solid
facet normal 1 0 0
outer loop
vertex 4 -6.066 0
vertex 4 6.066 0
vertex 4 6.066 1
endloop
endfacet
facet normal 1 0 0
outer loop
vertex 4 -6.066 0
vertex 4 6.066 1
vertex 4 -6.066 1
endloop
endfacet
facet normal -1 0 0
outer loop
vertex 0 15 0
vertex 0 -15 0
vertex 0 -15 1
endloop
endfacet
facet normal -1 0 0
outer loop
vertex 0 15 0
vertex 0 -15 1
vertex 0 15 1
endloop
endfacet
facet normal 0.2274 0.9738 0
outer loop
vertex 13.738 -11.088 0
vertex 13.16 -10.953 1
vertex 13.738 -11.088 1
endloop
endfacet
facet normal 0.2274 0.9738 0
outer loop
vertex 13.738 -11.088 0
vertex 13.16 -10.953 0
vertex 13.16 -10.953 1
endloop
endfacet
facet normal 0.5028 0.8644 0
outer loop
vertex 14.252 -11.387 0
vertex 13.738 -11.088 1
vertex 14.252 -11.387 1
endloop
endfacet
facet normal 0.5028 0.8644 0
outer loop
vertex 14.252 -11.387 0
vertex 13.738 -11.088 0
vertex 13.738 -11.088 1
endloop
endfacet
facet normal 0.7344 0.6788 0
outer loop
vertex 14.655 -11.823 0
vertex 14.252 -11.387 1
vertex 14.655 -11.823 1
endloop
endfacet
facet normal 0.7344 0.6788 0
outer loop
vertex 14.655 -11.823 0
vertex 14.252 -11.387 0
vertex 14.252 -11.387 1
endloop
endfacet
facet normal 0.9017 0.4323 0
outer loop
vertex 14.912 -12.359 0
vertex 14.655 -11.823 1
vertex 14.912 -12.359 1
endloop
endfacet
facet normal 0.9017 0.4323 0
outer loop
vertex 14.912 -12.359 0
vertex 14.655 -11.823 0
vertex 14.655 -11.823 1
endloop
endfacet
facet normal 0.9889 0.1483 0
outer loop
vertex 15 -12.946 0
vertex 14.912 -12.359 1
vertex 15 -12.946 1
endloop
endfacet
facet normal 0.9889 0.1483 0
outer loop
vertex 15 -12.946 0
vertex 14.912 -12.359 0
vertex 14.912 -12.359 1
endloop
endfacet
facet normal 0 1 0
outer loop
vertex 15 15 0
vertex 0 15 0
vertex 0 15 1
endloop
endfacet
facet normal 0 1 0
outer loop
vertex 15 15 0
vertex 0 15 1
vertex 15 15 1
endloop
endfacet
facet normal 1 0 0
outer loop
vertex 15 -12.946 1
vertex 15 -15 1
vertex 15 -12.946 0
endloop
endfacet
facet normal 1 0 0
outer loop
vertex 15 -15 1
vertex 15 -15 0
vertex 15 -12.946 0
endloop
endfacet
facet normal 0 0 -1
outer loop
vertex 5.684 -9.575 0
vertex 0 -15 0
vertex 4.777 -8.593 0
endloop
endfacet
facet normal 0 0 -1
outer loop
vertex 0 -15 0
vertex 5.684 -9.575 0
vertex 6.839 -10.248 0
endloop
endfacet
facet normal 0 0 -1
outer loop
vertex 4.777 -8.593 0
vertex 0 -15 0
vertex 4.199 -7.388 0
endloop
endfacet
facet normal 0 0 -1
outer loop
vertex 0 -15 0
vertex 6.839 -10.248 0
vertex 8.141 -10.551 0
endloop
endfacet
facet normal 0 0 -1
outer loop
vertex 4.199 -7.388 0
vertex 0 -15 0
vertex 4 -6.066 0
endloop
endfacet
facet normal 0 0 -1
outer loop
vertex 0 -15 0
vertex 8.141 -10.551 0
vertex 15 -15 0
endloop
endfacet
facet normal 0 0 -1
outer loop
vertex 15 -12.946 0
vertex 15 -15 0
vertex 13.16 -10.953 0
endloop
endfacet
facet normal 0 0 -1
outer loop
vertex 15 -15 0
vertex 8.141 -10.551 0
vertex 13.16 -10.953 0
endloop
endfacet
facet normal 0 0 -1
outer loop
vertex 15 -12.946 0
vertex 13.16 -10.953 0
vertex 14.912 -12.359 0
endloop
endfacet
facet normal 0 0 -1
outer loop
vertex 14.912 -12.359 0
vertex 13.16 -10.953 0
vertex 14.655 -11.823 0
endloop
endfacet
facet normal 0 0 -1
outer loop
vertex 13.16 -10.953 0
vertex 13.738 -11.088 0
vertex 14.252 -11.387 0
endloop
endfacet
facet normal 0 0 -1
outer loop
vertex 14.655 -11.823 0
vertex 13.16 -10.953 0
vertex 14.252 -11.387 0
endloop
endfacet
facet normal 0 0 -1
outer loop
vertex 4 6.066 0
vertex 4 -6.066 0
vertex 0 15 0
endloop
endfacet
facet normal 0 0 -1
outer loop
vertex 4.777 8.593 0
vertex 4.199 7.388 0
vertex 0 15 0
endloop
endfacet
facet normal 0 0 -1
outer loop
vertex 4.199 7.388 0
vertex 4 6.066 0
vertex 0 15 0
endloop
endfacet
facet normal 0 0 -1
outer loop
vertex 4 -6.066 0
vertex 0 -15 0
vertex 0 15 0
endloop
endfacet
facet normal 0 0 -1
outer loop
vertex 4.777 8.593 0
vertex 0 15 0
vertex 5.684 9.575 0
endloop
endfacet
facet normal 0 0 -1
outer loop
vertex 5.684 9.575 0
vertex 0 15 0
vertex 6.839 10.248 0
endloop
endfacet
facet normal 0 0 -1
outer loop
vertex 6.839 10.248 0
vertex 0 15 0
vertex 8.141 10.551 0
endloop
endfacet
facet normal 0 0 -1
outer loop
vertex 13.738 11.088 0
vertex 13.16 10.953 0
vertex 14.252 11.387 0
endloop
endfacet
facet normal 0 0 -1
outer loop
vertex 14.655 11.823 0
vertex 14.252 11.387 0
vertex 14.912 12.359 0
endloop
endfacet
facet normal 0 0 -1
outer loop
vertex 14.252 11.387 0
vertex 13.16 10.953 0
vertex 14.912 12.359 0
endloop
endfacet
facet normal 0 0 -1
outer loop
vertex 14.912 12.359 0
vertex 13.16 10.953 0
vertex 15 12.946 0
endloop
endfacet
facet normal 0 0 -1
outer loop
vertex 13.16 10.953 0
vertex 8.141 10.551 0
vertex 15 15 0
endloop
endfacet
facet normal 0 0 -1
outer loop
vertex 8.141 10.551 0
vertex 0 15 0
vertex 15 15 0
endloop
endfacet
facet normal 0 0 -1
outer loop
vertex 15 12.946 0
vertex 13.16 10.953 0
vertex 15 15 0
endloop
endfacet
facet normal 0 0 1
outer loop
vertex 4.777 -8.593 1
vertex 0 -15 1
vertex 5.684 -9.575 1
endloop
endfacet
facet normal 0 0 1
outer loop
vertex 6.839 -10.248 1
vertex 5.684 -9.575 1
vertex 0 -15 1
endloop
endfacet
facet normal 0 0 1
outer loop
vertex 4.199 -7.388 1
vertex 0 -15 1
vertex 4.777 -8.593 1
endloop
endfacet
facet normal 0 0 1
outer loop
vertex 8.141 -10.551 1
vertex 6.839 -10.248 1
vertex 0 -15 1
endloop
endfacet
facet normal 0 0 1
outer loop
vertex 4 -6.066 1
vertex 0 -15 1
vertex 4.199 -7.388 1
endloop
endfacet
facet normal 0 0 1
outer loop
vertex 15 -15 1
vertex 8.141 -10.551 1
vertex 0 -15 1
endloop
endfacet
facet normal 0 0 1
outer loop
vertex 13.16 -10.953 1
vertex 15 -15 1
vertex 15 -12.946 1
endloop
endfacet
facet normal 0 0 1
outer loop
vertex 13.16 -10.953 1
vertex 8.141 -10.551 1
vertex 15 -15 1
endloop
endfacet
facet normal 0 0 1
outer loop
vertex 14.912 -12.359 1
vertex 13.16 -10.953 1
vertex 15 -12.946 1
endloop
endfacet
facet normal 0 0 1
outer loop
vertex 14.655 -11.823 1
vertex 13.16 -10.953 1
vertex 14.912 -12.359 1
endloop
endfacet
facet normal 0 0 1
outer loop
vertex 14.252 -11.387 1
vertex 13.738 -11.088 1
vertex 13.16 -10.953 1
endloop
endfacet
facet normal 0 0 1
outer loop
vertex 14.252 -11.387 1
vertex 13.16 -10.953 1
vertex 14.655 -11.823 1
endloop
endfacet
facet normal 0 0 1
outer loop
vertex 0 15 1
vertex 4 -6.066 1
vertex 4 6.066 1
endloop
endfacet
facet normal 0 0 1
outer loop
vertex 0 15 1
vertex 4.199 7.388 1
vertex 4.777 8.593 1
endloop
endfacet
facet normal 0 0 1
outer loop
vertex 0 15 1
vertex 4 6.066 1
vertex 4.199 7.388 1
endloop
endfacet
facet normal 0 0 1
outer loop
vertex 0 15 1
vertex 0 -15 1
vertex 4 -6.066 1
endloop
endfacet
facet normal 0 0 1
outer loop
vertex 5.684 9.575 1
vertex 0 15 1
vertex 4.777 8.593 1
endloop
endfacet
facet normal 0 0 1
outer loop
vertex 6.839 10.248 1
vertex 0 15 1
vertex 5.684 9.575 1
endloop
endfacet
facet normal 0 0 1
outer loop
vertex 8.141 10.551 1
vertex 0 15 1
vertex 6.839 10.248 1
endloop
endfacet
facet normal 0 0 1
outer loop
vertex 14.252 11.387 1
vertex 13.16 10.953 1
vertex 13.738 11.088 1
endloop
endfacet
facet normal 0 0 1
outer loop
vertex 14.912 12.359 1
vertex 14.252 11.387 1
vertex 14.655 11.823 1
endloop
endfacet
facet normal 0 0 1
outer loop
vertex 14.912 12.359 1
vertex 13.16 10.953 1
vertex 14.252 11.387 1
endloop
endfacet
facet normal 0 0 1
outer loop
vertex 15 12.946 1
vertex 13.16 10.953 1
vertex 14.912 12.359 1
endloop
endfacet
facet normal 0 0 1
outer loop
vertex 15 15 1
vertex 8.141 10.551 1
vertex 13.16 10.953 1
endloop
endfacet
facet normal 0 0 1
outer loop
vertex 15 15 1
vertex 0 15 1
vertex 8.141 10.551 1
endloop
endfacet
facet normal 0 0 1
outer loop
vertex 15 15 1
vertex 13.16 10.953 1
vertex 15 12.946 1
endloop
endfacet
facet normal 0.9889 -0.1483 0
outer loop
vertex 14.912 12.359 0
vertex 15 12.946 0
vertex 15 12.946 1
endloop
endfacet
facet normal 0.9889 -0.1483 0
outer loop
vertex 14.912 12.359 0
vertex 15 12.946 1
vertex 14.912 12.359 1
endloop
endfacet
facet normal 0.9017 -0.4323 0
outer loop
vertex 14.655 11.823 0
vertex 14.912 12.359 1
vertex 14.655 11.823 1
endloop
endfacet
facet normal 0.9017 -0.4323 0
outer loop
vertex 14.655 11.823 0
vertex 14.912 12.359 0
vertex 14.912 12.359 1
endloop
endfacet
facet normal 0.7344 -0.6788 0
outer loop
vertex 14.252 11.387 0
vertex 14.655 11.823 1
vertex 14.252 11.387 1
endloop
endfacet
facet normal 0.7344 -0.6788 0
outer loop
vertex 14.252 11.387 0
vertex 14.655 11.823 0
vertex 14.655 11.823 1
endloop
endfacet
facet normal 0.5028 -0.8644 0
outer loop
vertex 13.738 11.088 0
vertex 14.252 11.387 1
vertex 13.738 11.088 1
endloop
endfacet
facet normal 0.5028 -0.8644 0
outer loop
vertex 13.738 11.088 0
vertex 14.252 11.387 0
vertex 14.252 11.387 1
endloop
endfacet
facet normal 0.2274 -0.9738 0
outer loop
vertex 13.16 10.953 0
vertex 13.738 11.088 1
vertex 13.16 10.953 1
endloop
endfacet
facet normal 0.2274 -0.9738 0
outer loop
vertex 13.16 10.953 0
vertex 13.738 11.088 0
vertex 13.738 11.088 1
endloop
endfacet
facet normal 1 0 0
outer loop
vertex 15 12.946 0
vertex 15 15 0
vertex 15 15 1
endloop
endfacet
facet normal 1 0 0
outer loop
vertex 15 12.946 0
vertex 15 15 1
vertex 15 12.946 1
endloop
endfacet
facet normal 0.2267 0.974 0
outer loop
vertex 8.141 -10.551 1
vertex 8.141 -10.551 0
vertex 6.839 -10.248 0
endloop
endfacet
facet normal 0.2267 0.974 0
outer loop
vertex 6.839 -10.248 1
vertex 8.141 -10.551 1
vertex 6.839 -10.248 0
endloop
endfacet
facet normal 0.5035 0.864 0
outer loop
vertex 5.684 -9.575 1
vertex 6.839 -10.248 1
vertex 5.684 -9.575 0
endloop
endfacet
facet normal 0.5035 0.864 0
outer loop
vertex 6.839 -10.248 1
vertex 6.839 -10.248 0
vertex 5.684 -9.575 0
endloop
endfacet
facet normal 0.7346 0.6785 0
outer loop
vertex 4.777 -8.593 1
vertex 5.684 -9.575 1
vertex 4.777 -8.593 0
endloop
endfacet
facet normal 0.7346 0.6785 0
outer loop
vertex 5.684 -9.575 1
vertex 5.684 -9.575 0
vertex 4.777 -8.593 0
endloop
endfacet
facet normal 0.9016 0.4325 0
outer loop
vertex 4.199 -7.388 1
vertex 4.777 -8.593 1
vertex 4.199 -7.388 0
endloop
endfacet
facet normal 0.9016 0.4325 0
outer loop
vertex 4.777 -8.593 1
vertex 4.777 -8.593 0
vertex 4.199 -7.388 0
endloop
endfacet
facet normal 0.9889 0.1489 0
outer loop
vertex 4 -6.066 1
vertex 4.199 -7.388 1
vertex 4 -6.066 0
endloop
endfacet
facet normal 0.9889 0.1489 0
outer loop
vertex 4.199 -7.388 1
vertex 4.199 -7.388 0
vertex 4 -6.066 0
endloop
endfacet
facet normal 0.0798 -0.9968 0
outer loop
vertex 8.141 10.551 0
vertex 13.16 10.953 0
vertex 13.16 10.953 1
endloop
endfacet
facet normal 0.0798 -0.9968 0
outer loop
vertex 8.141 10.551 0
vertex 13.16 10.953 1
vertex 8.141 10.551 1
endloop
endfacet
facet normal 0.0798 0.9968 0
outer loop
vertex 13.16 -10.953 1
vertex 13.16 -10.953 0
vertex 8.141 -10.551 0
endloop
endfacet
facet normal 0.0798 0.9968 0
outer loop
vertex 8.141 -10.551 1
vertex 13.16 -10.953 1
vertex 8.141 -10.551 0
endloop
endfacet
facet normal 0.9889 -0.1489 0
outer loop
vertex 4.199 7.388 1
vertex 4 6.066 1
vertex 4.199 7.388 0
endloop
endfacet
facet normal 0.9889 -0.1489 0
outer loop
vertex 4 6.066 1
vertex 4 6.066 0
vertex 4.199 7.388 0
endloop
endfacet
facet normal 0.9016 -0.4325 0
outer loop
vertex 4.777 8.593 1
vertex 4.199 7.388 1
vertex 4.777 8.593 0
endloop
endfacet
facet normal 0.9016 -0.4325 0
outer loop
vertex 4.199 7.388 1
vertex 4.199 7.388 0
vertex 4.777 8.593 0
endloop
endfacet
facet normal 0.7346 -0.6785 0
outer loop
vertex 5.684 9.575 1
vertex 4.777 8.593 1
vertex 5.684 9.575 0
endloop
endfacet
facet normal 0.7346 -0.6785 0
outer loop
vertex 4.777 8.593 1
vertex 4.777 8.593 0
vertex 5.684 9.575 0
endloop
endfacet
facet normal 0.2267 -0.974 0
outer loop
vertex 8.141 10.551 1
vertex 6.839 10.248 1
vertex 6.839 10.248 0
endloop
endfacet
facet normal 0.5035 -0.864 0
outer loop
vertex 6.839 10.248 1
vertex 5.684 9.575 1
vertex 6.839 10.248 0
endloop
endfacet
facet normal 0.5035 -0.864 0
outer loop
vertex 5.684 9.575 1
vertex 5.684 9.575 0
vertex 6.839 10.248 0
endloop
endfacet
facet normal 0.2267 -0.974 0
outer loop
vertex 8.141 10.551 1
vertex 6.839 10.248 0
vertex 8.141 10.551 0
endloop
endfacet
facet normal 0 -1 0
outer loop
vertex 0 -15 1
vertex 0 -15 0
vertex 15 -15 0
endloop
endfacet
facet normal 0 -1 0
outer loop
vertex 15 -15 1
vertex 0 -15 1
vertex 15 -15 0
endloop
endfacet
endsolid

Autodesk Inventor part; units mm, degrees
ref_plane "YZ Plane" through (0, 0, 0) normal (1, 0, 0) x (0, 1, 0)
ref_plane "Начальная плоскость" through (0, 0, 0) normal (0, 0, 1) x (1, 0, 0)
ref_plane "Конечная плоскость" through (0, 0, 1) normal (0, 0, 1) x (1, 0, 0)
sketch "Эскиз" plane through (0, 0, 0) normal (0, 0, 1) x (1, 0, 0)
  line L0 (0, -15) -> (0, 15)
  line L1 (0, 15) -> (15, 15)
  line L2 (15, 15) -> (15, 12.9464)
  line L3 (13.1595, 10.9528) -> (8.1411, 10.5513)
  line L4 (4, 6.0656) -> (4, -6.0656)
  line L5 (7.5, 15) -> (7.5, 10.5) construction
  line L6 (15, 11.1) -> (15, 10.5) construction
  line L7 (15, 10.5) -> (7.5, 10.5) construction
  line L8 (0, -15) -> (15, -15)
  line L9 (15, -15) -> (15, -12.9464)
  line L10 (13.1595, -10.9528) -> (8.1411, -10.5513)
  arc A0 (8.1411, 10.5513) -> (4, 6.0656) centre (8.5, 6.0656) ccw
  arc A1 (4, -6.0656) -> (8.1411, -10.5513) centre (8.5, -6.0656) ccw
  arc A2 (13.1595, 10.9528) -> (15, 12.9464) centre (13, 12.9464) ccw
  arc A3 (15, -12.9464) -> (13.1595, -10.9528) centre (13, -12.9464) ccw
  line L11 (0, 0) -> (4, 0) construction
  line L12 (0, 0) -> (15, 0) construction
  point P0 (7.5, -10.5)
  dimension "d5" = 0.6
  dimension "d23" = 4.5
  dimension "d24" = 2
  dimension "d31" = 15
  dimension "d32" = 7.5
  dimension "d33" = 4.5
  dimension "d34" = 30
  dimension "d35" = 4
  dimension "d36" = 7.5
  dimension "d37" = 4.5
  dimension "d38" = 90
extrude "Базовый элемент" add sketch "Эскиз" along normal up to surface (1 mm away) from surface at 0
sketch "Sketch3" plane through (0, 0, 0) normal (0, 0, 1) x (1, 0, 0)
  line L0 (0, 0) -> (10, 0)
ref_plane "Work Plane3" through (0, 0, 0) normal (0, -1, 0) x (1, 0, 0)
sketch "Sketch4" plane through (0, 0, 0) normal (0, -1, 0) x (1, 0, 0)
  line L0 (-2, 0) -> (12, 0)
  line L1 (-2, 1) -> (12, 1)
  dimension "d29" = 1
equation "\"d23\" = G_IR"
equation "\"d24\" = G_ER"
equation "\"d31\" = G_W"
equation "\"d32\" = G_C"
equation "\"d33\" = G_T1"
equation "\"d34\" = G_H"
equation "\"d35\" = G_T"
equation "\"d36\" = d32"
equation "\"d37\" = d33"
equation "\"d6\" = G_L"
equation "\"G_W\" = 15"
equation "\"G_H\" = 30"
equation "\"G_T\" = 4"
equation "\"G_T1\" = 4.5"
equation "\"G_NG\" = 0.08"
equation "\"G_ER\" = 2"
equation "\"G_IR\" = 4.5"
equation "\"G_C\" = 7.5"
equation "\"G_L\" = d29"
equation "\"ex\" = 0"
equation "\"G_OFFSET_START\" = 0"
equation "\"G_OFFSET_END\" = 0"
equation "\"d27\" = G_OFFSET_END + B_L"
equation "\"B_L\" = 1"
properties part number "DIN 1026-1" material "S235JR ДСТУ EN 10025-1"
